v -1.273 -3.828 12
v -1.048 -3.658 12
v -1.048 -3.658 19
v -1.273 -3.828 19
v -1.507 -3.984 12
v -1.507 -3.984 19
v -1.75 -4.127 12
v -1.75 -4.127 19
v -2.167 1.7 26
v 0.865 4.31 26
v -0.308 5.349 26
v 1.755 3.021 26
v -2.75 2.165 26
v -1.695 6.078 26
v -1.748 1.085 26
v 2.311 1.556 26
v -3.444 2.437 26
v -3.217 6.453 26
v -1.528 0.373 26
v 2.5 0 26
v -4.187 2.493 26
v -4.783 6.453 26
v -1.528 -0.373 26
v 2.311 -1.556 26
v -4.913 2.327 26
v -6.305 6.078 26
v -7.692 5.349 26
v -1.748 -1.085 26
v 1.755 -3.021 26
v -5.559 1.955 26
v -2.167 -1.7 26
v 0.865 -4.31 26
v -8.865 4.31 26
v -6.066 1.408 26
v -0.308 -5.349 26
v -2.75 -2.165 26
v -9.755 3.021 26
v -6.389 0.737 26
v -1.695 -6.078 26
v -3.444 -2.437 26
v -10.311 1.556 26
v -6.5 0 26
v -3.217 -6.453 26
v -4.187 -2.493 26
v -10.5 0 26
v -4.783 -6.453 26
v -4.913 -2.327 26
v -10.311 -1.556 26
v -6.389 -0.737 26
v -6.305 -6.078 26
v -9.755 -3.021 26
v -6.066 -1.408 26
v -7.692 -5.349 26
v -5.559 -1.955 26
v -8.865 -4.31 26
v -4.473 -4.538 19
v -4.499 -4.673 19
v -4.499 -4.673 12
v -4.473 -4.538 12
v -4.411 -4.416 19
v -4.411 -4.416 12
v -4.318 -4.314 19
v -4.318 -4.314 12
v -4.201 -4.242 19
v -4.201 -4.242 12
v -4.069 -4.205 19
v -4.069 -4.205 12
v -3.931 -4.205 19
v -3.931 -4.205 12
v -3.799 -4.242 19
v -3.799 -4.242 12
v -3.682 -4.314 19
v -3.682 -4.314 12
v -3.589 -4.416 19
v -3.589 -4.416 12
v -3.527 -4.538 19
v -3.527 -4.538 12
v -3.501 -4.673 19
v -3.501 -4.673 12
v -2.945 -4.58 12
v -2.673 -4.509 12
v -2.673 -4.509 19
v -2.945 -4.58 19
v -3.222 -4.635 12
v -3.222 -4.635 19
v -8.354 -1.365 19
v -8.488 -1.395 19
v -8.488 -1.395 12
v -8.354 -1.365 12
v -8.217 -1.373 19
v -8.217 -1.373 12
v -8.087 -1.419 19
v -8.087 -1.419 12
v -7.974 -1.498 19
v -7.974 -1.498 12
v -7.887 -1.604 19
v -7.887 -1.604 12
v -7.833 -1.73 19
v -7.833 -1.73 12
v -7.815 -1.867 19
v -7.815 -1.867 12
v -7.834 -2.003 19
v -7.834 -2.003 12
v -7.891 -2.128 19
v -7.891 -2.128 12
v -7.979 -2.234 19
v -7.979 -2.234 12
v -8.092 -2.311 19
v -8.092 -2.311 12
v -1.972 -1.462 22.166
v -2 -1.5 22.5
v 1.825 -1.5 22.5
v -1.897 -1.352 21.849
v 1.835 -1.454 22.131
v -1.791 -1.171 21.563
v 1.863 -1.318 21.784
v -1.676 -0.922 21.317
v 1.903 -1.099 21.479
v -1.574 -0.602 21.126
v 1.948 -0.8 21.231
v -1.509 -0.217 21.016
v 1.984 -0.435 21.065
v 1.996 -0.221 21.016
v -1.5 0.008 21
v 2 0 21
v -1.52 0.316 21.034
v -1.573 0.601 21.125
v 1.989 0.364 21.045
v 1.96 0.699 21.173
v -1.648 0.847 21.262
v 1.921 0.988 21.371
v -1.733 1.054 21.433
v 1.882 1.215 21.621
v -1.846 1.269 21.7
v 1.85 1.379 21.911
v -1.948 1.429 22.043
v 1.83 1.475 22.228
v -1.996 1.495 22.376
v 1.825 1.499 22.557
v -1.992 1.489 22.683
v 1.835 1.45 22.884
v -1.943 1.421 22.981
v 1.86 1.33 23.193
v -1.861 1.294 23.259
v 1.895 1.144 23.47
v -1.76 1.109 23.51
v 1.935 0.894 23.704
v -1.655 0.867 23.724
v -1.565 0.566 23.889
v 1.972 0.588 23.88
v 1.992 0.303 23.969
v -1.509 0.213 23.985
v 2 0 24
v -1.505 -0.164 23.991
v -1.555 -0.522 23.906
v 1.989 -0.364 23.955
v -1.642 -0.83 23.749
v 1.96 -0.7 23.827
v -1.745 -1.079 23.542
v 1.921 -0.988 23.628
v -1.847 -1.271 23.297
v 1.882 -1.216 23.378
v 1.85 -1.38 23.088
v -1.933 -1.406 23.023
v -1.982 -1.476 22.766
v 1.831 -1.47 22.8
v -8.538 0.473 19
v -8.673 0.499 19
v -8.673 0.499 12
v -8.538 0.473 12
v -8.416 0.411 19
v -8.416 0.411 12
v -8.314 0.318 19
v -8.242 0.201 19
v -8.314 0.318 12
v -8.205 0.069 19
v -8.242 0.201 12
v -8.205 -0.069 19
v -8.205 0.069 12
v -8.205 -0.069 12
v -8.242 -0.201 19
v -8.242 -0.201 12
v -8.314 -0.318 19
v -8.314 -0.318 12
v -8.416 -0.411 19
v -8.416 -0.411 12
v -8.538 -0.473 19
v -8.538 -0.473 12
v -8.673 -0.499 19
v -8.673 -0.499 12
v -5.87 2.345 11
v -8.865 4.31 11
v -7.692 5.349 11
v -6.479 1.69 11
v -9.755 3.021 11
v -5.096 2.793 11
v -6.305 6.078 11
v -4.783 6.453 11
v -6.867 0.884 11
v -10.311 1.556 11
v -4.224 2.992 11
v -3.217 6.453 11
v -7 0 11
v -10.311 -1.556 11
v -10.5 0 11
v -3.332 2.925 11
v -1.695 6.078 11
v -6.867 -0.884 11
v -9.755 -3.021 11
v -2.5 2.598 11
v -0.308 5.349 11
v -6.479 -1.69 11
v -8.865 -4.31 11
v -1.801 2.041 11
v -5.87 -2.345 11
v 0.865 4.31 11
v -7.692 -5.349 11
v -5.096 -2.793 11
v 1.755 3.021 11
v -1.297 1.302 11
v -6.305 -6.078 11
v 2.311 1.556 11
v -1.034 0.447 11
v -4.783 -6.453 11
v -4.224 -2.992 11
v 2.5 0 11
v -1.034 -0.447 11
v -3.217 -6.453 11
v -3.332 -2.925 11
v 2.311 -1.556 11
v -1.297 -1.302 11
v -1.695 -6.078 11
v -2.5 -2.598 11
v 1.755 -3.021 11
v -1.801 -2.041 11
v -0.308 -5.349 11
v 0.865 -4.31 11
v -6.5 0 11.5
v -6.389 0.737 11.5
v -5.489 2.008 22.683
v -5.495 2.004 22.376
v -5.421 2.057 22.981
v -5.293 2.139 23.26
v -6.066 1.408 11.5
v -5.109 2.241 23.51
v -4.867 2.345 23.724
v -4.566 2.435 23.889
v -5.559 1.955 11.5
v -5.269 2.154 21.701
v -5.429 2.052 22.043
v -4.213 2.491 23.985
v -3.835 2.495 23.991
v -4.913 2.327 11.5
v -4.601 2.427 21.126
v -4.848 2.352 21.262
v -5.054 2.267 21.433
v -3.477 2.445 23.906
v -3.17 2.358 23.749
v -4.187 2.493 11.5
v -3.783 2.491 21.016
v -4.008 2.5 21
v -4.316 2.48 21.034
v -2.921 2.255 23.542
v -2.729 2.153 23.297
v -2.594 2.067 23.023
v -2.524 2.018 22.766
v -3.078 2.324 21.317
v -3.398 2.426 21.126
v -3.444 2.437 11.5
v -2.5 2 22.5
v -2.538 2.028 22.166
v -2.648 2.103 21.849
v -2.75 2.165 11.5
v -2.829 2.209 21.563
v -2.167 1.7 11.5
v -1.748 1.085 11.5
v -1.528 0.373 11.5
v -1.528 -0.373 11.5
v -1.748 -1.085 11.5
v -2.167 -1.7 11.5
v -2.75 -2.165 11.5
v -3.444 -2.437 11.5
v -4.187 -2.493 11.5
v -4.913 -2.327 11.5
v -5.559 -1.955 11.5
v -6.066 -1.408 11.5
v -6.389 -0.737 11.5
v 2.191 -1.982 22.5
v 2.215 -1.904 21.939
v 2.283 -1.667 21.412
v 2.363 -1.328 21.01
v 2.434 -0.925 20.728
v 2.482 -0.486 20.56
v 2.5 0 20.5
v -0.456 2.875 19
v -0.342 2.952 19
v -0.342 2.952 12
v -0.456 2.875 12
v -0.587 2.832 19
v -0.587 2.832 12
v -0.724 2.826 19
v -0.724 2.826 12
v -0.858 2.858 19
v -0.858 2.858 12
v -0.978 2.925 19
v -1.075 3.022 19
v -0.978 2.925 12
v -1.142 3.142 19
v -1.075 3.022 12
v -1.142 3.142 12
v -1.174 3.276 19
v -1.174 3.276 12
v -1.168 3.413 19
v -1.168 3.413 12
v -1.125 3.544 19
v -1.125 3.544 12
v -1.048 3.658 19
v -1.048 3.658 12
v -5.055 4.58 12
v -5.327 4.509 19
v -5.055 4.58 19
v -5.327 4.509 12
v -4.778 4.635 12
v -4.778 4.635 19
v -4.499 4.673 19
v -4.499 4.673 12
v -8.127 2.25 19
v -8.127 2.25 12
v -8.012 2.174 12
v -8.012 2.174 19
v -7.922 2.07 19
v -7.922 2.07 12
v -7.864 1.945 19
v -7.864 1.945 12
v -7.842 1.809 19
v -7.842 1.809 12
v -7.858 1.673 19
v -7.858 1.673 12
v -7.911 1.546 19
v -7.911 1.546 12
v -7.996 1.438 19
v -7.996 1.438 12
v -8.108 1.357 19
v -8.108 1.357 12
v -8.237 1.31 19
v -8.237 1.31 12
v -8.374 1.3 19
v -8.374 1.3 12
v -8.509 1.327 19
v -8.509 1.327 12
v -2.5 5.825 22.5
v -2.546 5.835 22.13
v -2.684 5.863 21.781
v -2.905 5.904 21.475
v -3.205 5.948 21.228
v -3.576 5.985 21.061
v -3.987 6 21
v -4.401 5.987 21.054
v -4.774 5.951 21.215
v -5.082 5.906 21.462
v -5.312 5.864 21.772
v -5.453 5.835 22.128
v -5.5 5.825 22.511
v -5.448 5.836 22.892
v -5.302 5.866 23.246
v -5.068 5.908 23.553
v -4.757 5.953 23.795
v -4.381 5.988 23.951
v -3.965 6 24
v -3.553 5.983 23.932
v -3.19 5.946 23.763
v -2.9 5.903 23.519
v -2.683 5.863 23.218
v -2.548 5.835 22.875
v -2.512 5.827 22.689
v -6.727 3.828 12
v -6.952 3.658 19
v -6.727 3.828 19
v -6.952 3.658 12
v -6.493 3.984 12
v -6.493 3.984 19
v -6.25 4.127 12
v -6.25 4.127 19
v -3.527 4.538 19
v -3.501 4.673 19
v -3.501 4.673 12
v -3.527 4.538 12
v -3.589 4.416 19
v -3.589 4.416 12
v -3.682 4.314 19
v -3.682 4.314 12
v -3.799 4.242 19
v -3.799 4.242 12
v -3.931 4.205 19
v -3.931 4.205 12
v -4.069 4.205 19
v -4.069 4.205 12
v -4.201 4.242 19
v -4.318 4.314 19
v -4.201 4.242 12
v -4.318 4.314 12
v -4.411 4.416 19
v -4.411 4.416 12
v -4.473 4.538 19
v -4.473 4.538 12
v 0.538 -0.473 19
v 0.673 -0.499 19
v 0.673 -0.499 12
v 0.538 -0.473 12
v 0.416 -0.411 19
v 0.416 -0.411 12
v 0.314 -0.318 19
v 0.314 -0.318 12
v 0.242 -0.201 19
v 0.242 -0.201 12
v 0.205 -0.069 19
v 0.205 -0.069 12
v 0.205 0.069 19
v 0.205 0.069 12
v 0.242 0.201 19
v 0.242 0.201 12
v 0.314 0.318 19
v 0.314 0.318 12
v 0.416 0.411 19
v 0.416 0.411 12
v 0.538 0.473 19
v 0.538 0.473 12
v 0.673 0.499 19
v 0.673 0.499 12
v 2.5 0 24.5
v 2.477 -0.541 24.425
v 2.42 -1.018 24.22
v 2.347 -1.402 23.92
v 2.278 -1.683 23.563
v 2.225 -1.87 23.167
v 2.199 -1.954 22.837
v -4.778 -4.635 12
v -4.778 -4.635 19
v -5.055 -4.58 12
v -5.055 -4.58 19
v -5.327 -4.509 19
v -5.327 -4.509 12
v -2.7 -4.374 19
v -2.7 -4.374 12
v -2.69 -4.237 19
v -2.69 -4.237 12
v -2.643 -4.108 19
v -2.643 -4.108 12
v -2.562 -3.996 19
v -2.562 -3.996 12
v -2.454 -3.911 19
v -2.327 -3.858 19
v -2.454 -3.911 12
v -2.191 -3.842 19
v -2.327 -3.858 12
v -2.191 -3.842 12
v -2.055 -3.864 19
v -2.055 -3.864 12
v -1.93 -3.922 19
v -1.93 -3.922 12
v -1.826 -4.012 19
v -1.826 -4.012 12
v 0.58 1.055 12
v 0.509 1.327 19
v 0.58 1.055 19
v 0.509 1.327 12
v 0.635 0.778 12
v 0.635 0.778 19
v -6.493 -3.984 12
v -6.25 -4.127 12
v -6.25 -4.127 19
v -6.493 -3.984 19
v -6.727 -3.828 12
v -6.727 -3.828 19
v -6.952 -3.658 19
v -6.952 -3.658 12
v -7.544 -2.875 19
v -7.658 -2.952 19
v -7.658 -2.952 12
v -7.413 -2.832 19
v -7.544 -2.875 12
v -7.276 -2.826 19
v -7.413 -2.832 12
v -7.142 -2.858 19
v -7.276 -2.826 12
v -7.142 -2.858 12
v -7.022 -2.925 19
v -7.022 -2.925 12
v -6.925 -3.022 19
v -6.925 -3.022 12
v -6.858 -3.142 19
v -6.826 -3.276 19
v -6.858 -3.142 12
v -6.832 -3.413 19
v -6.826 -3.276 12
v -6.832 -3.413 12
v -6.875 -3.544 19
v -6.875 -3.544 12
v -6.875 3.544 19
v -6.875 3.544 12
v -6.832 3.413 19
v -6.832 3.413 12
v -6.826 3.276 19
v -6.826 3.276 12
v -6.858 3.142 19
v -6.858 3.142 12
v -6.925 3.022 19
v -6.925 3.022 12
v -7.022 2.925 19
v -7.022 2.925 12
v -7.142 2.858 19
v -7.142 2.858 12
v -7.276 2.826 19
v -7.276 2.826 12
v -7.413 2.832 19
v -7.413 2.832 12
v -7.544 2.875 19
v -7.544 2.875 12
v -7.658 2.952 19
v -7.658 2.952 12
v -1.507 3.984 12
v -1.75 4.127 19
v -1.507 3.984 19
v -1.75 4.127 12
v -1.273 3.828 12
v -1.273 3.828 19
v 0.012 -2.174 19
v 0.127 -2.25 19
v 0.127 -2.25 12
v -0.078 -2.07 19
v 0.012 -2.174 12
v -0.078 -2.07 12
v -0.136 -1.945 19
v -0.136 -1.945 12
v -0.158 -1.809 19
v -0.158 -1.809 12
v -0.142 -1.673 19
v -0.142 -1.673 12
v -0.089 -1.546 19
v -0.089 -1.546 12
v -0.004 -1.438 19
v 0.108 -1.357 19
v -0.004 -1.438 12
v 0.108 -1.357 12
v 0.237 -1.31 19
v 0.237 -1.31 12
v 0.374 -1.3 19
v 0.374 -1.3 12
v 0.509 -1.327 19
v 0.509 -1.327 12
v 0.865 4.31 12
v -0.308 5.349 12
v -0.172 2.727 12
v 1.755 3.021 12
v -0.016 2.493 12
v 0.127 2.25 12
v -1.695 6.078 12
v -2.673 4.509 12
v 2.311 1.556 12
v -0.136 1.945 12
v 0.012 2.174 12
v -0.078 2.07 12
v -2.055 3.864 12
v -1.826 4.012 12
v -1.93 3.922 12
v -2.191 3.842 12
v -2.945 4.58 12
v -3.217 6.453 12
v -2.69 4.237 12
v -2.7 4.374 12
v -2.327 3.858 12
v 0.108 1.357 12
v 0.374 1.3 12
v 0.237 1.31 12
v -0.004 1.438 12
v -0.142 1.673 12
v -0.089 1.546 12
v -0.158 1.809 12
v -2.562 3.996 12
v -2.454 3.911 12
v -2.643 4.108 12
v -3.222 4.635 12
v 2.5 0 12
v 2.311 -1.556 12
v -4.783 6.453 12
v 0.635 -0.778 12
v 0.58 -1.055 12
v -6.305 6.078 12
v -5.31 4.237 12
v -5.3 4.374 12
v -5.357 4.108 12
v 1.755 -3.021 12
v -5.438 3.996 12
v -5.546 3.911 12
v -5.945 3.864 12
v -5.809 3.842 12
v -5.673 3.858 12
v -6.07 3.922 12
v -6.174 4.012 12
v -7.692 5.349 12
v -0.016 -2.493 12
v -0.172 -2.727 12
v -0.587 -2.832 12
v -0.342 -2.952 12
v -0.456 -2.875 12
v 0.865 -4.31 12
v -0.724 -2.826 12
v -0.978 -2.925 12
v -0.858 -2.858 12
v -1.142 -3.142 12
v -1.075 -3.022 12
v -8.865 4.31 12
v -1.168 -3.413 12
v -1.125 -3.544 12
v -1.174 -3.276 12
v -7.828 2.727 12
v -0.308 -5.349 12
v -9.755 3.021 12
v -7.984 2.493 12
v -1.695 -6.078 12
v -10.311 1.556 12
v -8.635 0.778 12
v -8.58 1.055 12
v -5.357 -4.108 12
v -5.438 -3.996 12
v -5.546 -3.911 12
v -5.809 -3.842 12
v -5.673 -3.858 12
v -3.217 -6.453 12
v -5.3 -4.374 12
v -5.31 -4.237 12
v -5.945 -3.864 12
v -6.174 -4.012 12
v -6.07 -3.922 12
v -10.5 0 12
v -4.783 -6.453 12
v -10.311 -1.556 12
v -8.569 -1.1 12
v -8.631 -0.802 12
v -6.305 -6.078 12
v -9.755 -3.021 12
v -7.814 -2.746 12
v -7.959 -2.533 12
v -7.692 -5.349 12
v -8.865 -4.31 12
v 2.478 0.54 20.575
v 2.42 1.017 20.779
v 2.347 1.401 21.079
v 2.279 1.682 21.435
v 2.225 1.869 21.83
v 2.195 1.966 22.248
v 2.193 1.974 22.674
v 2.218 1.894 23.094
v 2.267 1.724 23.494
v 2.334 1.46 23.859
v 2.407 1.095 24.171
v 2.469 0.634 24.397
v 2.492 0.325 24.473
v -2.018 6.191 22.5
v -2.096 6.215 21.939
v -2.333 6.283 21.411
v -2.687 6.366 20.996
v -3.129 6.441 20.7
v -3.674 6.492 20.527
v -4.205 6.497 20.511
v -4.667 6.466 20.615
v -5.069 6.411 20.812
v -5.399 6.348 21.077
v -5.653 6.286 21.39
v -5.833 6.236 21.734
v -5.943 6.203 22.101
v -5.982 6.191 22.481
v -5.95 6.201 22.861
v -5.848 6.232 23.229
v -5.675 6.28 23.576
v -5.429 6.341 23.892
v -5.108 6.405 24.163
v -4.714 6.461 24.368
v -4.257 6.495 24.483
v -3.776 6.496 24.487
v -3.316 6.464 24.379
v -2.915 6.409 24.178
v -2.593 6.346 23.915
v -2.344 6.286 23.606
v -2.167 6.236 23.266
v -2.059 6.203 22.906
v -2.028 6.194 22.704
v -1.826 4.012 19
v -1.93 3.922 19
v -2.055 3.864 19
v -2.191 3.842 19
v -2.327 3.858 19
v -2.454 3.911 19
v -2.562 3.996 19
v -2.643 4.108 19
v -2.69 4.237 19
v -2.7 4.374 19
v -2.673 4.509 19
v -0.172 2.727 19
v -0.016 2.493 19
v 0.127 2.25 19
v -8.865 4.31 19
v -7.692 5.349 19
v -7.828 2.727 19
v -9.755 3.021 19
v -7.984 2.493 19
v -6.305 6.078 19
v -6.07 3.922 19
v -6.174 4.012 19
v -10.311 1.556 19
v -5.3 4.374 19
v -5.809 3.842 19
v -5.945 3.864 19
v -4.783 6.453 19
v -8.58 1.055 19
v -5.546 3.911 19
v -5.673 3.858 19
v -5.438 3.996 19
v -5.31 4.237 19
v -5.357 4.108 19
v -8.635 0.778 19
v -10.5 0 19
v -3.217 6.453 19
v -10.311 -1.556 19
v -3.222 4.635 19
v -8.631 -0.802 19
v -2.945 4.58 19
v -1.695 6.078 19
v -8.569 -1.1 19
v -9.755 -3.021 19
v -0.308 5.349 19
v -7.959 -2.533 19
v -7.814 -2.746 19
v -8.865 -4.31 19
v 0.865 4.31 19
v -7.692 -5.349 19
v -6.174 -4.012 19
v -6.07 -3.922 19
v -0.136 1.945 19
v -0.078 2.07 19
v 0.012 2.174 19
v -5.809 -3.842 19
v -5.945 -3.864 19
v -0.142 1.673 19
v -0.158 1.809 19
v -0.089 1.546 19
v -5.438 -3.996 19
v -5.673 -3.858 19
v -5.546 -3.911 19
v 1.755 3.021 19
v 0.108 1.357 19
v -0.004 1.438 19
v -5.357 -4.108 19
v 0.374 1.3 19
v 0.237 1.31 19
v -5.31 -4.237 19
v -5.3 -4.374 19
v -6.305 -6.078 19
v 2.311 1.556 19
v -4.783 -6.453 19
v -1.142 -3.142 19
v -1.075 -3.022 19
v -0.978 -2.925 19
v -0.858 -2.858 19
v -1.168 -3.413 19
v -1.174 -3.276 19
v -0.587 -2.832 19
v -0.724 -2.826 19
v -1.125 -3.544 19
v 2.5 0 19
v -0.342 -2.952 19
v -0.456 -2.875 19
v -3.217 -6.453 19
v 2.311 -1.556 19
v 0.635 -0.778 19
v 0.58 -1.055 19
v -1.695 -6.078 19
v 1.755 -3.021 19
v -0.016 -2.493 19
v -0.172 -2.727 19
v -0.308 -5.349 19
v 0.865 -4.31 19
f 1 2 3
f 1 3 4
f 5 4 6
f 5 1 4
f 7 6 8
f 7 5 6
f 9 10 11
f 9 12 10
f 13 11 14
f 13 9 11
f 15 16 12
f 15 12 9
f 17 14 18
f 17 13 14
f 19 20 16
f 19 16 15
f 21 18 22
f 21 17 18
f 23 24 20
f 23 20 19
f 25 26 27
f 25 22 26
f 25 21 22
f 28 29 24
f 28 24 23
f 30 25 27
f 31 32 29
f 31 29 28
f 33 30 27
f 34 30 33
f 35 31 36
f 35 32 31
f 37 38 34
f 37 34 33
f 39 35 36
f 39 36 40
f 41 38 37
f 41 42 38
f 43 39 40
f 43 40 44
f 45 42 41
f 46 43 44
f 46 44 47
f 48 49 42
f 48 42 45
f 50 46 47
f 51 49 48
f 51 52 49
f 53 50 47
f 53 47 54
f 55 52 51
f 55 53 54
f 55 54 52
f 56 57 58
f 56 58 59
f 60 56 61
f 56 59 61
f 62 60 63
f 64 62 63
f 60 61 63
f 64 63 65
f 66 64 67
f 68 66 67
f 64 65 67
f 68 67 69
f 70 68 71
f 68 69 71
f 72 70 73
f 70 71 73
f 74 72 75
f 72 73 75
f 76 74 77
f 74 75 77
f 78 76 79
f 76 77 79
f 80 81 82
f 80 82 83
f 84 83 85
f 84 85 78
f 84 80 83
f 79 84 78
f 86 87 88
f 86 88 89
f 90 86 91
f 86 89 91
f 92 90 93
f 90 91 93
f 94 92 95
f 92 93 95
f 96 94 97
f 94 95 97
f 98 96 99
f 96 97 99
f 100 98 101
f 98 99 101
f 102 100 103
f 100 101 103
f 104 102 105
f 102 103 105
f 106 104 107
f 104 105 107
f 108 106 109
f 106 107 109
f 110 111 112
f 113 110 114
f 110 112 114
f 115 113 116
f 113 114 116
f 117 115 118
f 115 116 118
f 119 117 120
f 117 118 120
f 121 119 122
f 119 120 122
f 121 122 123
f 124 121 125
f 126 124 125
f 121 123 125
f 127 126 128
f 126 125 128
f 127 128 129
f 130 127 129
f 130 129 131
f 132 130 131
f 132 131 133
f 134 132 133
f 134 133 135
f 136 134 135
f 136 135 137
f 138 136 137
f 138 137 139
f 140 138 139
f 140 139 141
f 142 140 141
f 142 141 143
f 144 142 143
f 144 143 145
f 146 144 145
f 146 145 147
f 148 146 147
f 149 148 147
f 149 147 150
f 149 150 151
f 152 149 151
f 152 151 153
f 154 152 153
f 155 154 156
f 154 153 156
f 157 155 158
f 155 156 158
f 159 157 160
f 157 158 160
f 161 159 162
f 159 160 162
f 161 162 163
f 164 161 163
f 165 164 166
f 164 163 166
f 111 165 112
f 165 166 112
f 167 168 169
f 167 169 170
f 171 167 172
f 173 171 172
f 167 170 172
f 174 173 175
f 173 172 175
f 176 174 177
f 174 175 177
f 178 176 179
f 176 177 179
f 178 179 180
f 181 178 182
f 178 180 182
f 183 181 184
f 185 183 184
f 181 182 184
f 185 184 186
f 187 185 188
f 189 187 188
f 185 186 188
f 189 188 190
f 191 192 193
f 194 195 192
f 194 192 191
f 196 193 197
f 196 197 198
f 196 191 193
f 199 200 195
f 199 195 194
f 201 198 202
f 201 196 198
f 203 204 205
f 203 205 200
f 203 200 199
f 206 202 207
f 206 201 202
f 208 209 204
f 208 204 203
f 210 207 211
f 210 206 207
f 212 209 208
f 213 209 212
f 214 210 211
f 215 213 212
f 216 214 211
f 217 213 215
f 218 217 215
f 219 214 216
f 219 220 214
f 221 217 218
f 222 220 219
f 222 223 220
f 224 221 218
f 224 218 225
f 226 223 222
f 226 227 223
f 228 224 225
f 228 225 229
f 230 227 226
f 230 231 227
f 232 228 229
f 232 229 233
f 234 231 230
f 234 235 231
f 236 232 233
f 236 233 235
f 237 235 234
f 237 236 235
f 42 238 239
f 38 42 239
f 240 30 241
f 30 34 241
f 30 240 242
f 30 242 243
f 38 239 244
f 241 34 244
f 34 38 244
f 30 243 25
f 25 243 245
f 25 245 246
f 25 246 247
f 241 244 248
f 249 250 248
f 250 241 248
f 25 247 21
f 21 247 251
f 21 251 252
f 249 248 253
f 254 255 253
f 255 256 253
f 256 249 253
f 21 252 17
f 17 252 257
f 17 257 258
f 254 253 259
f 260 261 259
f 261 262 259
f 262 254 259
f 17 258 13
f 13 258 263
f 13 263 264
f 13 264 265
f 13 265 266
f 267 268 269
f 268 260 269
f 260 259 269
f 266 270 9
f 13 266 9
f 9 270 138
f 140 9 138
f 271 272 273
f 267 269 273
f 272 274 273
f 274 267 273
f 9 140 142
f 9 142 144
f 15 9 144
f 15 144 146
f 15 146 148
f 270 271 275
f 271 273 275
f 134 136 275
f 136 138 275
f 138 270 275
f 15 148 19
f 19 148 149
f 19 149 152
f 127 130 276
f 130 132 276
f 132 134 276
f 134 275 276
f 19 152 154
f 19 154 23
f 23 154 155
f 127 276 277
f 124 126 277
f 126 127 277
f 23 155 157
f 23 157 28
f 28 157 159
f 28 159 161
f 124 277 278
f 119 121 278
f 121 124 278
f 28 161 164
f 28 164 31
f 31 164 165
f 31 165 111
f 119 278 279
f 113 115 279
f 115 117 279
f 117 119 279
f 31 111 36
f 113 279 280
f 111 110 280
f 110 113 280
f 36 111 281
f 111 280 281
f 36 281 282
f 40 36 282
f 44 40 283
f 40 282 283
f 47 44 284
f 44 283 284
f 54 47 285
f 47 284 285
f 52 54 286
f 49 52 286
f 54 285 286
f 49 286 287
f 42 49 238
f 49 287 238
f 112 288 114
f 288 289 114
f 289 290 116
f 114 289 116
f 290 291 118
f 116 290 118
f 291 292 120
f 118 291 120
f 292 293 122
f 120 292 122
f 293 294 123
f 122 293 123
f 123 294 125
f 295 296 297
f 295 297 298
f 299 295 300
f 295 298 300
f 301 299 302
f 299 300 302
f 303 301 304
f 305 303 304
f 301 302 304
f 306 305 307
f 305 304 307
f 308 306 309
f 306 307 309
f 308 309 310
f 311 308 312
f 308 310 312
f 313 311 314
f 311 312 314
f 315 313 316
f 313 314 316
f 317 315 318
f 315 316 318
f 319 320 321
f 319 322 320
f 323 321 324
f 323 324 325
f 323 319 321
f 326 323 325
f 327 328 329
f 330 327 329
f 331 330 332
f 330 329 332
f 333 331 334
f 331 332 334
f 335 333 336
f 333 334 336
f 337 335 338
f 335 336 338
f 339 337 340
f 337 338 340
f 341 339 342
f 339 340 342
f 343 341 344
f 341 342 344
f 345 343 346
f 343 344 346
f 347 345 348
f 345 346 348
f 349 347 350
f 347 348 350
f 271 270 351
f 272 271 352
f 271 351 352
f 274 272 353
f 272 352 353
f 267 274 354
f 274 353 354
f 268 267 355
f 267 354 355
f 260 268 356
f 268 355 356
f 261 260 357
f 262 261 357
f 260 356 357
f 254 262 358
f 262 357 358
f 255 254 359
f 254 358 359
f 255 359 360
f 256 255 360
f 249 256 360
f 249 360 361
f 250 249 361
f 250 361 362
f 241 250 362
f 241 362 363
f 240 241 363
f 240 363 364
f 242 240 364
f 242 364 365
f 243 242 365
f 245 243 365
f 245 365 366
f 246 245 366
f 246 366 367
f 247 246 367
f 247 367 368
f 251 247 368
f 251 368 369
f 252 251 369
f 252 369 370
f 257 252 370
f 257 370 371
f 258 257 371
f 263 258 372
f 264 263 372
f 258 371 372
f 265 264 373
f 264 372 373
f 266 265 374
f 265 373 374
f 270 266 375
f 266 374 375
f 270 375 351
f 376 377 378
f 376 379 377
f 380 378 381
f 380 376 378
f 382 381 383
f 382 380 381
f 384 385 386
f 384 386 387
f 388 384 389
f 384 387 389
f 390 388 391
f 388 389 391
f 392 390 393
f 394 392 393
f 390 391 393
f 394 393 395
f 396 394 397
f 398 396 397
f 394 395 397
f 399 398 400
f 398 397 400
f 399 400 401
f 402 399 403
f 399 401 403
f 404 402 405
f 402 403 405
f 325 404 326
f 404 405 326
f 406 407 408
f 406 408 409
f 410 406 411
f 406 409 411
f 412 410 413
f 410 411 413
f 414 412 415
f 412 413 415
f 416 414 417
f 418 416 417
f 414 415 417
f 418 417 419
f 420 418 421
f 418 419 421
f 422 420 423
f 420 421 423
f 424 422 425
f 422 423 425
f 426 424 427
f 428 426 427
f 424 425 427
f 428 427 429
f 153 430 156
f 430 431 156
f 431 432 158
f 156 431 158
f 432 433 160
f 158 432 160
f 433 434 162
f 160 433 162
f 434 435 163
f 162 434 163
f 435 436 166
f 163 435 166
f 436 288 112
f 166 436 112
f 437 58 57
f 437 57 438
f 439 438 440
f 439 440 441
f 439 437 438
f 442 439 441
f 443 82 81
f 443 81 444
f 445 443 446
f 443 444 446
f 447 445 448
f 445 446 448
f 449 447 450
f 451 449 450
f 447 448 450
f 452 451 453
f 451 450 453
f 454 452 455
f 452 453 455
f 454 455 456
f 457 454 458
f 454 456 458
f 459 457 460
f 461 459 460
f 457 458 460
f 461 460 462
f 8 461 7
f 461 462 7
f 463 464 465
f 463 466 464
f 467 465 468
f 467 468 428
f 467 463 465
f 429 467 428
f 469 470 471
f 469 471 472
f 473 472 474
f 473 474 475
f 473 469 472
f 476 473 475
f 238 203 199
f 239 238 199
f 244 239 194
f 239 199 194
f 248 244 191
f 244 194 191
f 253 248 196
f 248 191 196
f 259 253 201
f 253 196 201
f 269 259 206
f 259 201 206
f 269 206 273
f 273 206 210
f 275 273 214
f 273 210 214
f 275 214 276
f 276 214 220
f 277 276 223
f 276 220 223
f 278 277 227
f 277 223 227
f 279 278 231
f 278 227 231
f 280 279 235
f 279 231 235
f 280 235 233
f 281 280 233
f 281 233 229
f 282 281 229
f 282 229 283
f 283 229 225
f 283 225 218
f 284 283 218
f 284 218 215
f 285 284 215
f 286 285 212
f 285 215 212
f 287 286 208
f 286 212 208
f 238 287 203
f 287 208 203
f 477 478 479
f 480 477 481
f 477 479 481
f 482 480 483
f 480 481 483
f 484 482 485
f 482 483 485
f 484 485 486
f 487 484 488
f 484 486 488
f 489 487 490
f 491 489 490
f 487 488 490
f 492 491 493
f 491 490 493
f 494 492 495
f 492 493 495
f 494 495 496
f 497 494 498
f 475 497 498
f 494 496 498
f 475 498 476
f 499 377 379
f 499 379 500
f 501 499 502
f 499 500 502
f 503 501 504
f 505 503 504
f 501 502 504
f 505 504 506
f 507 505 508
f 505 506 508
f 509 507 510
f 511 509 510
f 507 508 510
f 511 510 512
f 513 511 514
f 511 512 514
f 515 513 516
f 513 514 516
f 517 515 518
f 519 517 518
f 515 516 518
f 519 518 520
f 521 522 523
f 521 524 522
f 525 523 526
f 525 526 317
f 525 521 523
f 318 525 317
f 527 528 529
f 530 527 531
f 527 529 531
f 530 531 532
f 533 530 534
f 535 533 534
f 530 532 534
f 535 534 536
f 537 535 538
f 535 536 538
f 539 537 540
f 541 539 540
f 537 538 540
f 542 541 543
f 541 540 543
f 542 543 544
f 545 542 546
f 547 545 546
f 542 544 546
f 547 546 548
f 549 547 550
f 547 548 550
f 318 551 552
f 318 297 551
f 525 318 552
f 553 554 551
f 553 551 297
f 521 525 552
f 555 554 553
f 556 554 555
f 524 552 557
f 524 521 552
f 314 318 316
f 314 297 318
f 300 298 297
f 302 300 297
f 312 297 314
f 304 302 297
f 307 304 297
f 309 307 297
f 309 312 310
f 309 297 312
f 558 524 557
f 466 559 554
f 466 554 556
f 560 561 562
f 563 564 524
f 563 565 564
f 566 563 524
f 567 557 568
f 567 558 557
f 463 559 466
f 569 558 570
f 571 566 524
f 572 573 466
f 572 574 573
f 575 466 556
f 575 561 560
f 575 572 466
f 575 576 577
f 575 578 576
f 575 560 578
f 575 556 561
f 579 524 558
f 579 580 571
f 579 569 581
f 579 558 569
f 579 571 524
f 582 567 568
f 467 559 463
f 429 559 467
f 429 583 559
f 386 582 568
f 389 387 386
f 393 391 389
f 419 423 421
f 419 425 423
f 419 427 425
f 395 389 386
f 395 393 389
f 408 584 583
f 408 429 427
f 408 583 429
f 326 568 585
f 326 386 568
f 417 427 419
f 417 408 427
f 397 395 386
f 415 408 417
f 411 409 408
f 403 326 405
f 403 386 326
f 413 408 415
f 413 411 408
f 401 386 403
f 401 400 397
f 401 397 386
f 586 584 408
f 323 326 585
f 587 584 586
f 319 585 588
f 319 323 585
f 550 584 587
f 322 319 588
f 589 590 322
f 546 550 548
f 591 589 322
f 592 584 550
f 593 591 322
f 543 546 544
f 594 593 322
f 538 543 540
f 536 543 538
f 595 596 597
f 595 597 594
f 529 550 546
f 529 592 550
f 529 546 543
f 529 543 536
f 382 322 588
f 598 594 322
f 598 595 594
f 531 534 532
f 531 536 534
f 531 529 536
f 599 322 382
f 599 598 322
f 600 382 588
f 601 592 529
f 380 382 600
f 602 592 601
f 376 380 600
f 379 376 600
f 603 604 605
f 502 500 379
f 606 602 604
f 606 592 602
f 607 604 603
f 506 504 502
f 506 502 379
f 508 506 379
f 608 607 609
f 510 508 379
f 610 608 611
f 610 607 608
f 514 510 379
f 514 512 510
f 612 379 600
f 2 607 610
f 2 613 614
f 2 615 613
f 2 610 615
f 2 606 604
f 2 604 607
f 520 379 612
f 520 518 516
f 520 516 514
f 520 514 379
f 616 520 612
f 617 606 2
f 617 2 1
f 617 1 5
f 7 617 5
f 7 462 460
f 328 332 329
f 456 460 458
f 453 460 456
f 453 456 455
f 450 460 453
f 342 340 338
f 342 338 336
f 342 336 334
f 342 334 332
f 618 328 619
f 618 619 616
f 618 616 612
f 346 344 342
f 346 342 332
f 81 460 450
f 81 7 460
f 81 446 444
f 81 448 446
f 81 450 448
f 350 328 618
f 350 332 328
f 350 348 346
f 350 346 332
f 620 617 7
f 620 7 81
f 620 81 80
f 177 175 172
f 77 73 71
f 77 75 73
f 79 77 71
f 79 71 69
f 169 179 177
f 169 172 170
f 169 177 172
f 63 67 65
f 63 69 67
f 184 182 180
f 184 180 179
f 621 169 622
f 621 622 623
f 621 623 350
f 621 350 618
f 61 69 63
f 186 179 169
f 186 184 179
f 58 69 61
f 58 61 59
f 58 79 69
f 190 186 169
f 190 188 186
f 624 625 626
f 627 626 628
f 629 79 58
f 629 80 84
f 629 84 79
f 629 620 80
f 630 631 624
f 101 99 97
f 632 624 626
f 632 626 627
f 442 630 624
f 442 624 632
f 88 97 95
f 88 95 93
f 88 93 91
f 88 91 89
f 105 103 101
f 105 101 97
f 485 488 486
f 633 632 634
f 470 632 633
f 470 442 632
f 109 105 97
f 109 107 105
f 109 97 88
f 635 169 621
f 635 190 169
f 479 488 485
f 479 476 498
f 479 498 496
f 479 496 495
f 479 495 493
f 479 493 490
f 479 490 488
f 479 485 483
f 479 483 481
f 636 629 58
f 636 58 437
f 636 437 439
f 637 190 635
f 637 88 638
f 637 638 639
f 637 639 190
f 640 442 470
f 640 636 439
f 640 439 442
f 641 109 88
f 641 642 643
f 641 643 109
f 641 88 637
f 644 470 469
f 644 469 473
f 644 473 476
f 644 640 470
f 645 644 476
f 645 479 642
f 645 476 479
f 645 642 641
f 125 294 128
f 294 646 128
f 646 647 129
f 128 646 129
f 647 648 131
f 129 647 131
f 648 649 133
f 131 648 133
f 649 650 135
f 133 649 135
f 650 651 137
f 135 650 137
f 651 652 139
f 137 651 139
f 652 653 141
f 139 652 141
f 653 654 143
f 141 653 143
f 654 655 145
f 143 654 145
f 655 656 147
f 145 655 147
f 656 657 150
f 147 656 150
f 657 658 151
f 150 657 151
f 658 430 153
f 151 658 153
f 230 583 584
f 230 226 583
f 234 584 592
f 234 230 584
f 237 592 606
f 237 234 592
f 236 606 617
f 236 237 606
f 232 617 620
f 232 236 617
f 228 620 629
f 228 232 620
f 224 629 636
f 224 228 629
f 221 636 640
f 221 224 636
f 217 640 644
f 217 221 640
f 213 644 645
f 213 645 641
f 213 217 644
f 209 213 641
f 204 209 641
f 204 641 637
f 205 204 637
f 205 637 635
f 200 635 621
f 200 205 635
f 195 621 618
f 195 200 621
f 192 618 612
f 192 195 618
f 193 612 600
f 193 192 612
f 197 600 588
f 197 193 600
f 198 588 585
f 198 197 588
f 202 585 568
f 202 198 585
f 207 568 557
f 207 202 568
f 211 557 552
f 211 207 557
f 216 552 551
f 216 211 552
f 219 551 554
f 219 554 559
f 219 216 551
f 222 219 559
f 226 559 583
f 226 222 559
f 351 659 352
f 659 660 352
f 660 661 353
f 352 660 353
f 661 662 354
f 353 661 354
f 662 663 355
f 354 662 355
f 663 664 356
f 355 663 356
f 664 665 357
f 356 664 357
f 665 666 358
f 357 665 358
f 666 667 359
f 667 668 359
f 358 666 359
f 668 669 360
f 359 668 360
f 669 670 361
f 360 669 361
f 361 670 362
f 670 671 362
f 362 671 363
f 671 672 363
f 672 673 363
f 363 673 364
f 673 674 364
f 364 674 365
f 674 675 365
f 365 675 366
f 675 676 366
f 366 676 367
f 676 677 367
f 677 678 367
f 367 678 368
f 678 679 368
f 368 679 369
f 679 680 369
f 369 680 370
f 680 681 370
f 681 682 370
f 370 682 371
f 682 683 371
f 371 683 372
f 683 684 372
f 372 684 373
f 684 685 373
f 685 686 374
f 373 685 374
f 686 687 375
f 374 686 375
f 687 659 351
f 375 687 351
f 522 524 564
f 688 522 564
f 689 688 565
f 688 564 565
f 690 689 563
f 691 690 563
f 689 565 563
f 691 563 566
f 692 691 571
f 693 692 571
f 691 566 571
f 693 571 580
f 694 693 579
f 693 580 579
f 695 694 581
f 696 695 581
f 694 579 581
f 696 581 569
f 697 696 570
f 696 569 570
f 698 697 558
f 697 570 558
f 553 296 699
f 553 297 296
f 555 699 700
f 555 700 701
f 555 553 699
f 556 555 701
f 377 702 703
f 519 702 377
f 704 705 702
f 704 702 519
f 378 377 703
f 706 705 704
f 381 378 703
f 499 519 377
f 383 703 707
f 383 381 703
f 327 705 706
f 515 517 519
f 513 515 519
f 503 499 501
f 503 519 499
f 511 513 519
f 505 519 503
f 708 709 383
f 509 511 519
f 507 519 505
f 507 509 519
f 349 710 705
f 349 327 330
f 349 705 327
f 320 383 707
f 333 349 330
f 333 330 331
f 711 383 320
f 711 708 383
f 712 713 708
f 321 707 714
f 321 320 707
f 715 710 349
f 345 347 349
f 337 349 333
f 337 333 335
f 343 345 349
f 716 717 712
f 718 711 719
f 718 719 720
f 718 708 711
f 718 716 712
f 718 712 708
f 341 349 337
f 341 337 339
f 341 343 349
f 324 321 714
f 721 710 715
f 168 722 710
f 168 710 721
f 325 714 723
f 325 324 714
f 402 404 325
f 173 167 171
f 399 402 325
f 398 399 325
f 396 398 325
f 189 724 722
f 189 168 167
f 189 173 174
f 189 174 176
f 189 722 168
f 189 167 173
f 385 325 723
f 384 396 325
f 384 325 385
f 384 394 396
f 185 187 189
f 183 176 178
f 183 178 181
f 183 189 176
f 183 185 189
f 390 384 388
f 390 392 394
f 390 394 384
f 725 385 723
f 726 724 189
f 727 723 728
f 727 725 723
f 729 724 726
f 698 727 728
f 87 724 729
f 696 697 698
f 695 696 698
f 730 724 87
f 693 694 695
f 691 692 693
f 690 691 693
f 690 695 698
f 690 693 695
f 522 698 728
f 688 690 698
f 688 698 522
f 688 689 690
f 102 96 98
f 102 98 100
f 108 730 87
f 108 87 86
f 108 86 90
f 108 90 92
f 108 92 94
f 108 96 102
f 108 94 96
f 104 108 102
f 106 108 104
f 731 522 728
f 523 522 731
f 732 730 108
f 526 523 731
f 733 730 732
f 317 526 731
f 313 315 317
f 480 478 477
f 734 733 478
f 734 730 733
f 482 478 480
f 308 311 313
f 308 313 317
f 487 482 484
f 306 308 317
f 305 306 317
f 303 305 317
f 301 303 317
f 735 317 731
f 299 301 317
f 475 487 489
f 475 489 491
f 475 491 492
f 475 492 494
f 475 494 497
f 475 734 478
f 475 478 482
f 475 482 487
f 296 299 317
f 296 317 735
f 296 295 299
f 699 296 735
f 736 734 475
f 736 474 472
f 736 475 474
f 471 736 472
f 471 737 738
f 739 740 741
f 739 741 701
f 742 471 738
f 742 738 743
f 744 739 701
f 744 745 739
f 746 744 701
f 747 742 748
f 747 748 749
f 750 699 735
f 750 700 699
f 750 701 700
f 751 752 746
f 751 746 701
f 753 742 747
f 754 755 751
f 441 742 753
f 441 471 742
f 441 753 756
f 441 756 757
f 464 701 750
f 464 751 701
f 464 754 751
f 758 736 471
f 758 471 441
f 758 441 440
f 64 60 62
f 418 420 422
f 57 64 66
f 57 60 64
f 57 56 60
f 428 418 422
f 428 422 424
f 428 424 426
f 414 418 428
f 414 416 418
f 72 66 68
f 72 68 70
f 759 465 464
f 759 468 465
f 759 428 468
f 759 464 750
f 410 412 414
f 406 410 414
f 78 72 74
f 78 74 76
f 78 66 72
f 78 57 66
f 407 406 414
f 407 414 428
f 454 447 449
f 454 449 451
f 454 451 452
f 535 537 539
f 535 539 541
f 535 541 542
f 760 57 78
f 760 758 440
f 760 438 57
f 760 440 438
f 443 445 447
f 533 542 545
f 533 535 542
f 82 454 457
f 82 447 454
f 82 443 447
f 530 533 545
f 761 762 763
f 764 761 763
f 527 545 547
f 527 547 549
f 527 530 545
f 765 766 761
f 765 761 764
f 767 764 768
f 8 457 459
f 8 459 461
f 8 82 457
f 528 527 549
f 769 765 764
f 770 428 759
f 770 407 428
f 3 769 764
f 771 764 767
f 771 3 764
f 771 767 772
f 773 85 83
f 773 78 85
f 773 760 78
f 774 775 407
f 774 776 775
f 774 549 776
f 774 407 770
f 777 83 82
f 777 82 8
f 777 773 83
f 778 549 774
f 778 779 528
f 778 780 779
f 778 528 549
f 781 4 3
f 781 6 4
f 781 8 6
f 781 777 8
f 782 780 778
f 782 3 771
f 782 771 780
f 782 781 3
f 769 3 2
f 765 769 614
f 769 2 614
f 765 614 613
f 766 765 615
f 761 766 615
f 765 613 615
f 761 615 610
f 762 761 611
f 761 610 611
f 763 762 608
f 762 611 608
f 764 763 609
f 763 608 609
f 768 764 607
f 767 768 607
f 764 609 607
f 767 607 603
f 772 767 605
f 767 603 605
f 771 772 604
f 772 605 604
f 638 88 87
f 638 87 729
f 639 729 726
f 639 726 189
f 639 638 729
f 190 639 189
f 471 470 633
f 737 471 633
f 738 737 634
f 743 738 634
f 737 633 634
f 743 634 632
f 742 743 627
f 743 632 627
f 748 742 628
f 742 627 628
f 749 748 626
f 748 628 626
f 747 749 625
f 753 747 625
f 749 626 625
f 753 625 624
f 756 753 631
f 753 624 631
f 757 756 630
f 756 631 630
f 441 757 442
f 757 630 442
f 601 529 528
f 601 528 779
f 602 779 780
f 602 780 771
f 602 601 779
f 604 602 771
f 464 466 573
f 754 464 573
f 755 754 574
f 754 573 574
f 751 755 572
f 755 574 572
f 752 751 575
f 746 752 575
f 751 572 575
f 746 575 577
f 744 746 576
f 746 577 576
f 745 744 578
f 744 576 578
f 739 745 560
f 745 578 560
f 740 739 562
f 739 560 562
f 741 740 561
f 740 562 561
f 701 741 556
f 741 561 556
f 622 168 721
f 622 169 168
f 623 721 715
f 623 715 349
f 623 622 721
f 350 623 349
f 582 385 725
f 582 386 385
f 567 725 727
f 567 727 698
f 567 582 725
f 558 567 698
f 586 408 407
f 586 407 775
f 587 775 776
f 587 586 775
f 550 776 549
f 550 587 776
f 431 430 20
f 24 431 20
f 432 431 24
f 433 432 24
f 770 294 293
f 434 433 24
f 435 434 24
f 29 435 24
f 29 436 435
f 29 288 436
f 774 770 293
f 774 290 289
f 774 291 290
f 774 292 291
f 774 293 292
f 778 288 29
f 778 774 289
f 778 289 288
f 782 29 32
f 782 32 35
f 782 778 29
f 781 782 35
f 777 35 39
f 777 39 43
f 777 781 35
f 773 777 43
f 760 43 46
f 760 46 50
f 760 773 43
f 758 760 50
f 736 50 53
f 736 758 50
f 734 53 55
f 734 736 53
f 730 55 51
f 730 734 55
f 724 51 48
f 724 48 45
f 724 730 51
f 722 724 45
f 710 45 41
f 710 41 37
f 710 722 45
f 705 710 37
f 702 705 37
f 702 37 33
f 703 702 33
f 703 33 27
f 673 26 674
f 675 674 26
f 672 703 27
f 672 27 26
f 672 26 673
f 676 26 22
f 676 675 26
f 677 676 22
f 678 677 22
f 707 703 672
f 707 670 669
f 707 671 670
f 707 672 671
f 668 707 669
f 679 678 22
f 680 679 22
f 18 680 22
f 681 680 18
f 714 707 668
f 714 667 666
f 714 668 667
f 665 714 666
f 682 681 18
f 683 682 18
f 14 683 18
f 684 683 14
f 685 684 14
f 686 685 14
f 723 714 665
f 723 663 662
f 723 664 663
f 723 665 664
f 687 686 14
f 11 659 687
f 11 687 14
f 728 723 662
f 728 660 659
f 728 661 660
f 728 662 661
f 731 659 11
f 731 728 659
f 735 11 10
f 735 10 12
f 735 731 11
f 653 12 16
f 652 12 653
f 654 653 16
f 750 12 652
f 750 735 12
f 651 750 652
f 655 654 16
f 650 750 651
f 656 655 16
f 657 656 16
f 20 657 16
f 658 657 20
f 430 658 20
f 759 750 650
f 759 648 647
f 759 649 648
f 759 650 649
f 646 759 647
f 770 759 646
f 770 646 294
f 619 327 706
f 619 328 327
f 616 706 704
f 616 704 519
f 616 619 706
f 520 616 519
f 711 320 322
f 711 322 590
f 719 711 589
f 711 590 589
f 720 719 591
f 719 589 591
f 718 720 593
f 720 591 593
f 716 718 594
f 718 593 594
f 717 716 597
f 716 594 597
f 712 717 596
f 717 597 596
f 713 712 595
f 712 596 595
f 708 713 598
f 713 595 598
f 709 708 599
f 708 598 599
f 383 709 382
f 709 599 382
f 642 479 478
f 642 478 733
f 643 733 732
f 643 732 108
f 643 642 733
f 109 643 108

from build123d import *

# Parameters (mm, degrees)
SKETCH068_R            = 0.5
PAD053_DEPTH           = 7
SKETCH067_R            = 1.5
PAD052_DEPTH           = 8
SKETCH066_R            = 1.5
PAD051_DEPTH           = 8
SKETCH065_R            = 2.5
POCKET001_DEPTH        = 15
CHAMFER002_SIZE        = 0.5
CHAMFER003_SIZE        = 0.5
CUT005_PLACEMENT_ANGLE = 180


with BuildPart() as pad053:
    # Sketch068 → Pad053 (new body)
    with BuildSketch(Plane.XY.offset(14)):
        with Locations((0, 4.7)):
            Circle(SKETCH068_R)
        with Locations((0, -4.7)):
            Circle(SKETCH068_R)
        with Locations((4.7, 0)):
            Circle(SKETCH068_R)
        with Locations((-4.7, 0)):
            Circle(SKETCH068_R)
        with Locations((-3.323402, 3.323402)):
            Circle(SKETCH068_R)
        with Locations((3.323402, 3.323402)):
            Circle(SKETCH068_R)
        with Locations((-3.323402, -3.323402)):
            Circle(SKETCH068_R)
        with Locations((3.323402, -3.323402)):
            Circle(SKETCH068_R)
        with Locations((-1.798612, 4.342234)):
            Circle(SKETCH068_R)
        with Locations((1.798612, 4.342234)):
            Circle(SKETCH068_R)
        with Locations((4.342234, 1.798612)):
            Circle(SKETCH068_R)
        with Locations((4.342234, -1.798612)):
            Circle(SKETCH068_R)
        with Locations((1.798612, -4.342234)):
            Circle(SKETCH068_R)
        with Locations((-1.798612, -4.342234)):
            Circle(SKETCH068_R)
        with Locations((-4.342234, -1.798612)):
            Circle(SKETCH068_R)
        with Locations((-4.314713, 1.863666)):
            Circle(SKETCH068_R)
    extrude(amount=-PAD053_DEPTH)


with BuildPart() as pad052:
    # Sketch067 → Pad052 (new body)
    with BuildSketch(Plane(origin=(7, 0, 3.5), x_dir=(0, 1, 0), z_dir=(1, 0, 0))):
        Circle(SKETCH067_R)
    extrude(amount=-PAD052_DEPTH)


with BuildPart() as pad051:
    # Sketch066 → Pad051 (new body)
    with BuildSketch(Plane(origin=(0, -7, 3.5), x_dir=(1, 0, 0), z_dir=(0, -1, 0))):
        Circle(SKETCH066_R)
    extrude(amount=-PAD051_DEPTH)


with BuildPart() as gt1_pulley001:
    # Sketch064 → Revolution004 (revolve)
    with BuildSketch(Plane.XZ):
        Polygon((0, 0), (6.5, 0), (6.5, 7), (4.7, 7), (4.7, 14), (6.5, 14), (6.5, 15), (0, 15), align=None)
    revolve(axis=Axis((0, 0, 0), (0, 0, 1)))

    # Sketch065 (on Face7 of Revolution004) → Pocket001 (cut)
    with BuildSketch(Plane(origin=(0, 0, 15), x_dir=(-1, 0, 0), z_dir=(0, 0, 1))):
        Circle(SKETCH065_R)
    extrude(amount=-POCKET001_DEPTH, mode=Mode.SUBTRACT)

    # Cut003: cut Pad051
    add(pad051.part, mode=Mode.SUBTRACT)

    # Cut004: cut Pad052
    add(pad052.part, mode=Mode.SUBTRACT)

    # Chamfer002
    chamfer002_edges = [gt1_pulley001.edges().sort_by_distance(p)[0] for p in [
        (-4e-06, -6.499997, 4.999986),
        (-4e-06, -6.499997, 2.000014),
        (6.412872, 1.060693, 4.560627),
        (6.412872, 1.060693, 2.439373),
        (6.412872, -1.060693, 2.439373),
        (6.412872, -1.060693, 4.560627),
    ]]
    chamfer(chamfer002_edges, length=CHAMFER002_SIZE)

    # Chamfer003
    chamfer003_edges = [gt1_pulley001.edges().sort_by_distance(p)[0] for p in [
        (2.5, 0, 15),
    ]]
    chamfer(chamfer003_edges, length=CHAMFER003_SIZE)

    # Cut005: cut Pad053
    add(pad053.part, mode=Mode.SUBTRACT)


with BuildPart() as gt1_pulley001_1:
    # Cut005 placement: moved
    add(gt1_pulley001.part.moved(Location((-4, 0, 26))).rotate(Axis((-4, 0, 26), (1, 0, 0)), CUT005_PLACEMENT_ANGLE))


solid = gt1_pulley001_1.part
